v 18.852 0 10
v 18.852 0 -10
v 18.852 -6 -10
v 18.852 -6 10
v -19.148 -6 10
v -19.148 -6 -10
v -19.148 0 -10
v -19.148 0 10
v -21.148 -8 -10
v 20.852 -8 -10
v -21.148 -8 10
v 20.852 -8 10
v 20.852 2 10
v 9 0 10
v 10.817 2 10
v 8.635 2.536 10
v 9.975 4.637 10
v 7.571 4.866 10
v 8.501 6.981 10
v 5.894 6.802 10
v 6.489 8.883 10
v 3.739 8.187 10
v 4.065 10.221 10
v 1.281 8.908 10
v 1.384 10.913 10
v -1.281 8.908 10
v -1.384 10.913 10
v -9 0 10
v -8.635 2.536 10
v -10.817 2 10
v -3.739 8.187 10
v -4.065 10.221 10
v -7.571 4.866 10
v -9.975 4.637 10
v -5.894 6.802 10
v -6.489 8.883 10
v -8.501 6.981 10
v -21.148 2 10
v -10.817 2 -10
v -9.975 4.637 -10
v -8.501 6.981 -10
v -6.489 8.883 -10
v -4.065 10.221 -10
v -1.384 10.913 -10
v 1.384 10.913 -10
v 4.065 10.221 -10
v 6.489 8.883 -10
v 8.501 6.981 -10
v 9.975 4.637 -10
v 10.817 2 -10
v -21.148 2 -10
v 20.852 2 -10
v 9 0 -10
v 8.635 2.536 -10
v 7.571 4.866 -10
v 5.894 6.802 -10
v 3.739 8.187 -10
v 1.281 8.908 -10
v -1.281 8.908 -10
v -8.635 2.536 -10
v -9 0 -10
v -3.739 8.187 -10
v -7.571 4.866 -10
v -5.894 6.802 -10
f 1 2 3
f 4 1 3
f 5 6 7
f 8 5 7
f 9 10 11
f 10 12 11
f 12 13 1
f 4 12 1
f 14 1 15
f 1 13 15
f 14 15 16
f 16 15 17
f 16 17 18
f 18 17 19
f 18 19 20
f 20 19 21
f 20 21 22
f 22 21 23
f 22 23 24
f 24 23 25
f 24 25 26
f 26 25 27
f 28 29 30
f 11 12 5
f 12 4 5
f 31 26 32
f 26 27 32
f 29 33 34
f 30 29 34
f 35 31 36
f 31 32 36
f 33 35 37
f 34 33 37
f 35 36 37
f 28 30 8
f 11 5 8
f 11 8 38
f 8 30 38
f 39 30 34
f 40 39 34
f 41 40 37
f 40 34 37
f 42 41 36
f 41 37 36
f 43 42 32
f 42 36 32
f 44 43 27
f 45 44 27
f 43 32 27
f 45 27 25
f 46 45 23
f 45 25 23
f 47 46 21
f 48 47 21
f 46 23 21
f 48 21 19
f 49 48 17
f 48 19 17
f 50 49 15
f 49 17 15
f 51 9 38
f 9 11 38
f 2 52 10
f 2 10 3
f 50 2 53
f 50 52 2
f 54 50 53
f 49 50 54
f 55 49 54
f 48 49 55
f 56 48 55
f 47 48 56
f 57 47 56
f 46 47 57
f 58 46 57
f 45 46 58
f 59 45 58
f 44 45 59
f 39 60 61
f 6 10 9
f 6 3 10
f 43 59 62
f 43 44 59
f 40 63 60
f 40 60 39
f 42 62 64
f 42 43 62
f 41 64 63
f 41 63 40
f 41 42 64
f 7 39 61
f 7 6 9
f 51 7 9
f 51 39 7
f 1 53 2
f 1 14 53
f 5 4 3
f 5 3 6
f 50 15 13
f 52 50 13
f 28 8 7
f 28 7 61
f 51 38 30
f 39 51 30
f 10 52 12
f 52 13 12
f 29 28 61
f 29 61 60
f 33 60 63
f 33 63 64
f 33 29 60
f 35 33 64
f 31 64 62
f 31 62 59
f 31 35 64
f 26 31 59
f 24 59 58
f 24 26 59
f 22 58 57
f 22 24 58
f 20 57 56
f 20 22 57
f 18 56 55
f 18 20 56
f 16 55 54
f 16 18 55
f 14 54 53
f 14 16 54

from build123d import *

# Parameters (mm, degrees)
BOSS_EXTRUDE1_DEPTH = 10


with BuildPart() as part:
    # Sketch1 → Boss-Extrude1 (new, symmetric)
    with BuildSketch(Plane.XY):
        with BuildLine():
            Line((10.816653826, 2), (20.85239712, 2))
            Line((20.85239712, 2), (20.85239712, -8))
            Line((20.85239712, -8), (-21.14760288, -8))
            Line((-21.14760288, -8), (-21.14760288, 2))
            Line((-21.14760288, 2), (-10.816653826, 2))
            ThreePointArc((-10.816653826, 2), (0, 11), (10.816653826, 2))
        make_face()
        with BuildLine():
            Line((9, 0), (18.85239712, 0))
            Line((18.85239712, 0), (18.85239712, -6))
            Line((18.85239712, -6), (-19.14760288, -6))
            Line((-19.14760288, -6), (-19.14760288, 0))
            Line((-19.14760288, 0), (-9, 0))
            ThreePointArc((-9, 0), (0, 9), (9, 0))
        make_face(mode=Mode.SUBTRACT)
    extrude(amount=BOSS_EXTRUDE1_DEPTH, both=True)


solid = part.part
